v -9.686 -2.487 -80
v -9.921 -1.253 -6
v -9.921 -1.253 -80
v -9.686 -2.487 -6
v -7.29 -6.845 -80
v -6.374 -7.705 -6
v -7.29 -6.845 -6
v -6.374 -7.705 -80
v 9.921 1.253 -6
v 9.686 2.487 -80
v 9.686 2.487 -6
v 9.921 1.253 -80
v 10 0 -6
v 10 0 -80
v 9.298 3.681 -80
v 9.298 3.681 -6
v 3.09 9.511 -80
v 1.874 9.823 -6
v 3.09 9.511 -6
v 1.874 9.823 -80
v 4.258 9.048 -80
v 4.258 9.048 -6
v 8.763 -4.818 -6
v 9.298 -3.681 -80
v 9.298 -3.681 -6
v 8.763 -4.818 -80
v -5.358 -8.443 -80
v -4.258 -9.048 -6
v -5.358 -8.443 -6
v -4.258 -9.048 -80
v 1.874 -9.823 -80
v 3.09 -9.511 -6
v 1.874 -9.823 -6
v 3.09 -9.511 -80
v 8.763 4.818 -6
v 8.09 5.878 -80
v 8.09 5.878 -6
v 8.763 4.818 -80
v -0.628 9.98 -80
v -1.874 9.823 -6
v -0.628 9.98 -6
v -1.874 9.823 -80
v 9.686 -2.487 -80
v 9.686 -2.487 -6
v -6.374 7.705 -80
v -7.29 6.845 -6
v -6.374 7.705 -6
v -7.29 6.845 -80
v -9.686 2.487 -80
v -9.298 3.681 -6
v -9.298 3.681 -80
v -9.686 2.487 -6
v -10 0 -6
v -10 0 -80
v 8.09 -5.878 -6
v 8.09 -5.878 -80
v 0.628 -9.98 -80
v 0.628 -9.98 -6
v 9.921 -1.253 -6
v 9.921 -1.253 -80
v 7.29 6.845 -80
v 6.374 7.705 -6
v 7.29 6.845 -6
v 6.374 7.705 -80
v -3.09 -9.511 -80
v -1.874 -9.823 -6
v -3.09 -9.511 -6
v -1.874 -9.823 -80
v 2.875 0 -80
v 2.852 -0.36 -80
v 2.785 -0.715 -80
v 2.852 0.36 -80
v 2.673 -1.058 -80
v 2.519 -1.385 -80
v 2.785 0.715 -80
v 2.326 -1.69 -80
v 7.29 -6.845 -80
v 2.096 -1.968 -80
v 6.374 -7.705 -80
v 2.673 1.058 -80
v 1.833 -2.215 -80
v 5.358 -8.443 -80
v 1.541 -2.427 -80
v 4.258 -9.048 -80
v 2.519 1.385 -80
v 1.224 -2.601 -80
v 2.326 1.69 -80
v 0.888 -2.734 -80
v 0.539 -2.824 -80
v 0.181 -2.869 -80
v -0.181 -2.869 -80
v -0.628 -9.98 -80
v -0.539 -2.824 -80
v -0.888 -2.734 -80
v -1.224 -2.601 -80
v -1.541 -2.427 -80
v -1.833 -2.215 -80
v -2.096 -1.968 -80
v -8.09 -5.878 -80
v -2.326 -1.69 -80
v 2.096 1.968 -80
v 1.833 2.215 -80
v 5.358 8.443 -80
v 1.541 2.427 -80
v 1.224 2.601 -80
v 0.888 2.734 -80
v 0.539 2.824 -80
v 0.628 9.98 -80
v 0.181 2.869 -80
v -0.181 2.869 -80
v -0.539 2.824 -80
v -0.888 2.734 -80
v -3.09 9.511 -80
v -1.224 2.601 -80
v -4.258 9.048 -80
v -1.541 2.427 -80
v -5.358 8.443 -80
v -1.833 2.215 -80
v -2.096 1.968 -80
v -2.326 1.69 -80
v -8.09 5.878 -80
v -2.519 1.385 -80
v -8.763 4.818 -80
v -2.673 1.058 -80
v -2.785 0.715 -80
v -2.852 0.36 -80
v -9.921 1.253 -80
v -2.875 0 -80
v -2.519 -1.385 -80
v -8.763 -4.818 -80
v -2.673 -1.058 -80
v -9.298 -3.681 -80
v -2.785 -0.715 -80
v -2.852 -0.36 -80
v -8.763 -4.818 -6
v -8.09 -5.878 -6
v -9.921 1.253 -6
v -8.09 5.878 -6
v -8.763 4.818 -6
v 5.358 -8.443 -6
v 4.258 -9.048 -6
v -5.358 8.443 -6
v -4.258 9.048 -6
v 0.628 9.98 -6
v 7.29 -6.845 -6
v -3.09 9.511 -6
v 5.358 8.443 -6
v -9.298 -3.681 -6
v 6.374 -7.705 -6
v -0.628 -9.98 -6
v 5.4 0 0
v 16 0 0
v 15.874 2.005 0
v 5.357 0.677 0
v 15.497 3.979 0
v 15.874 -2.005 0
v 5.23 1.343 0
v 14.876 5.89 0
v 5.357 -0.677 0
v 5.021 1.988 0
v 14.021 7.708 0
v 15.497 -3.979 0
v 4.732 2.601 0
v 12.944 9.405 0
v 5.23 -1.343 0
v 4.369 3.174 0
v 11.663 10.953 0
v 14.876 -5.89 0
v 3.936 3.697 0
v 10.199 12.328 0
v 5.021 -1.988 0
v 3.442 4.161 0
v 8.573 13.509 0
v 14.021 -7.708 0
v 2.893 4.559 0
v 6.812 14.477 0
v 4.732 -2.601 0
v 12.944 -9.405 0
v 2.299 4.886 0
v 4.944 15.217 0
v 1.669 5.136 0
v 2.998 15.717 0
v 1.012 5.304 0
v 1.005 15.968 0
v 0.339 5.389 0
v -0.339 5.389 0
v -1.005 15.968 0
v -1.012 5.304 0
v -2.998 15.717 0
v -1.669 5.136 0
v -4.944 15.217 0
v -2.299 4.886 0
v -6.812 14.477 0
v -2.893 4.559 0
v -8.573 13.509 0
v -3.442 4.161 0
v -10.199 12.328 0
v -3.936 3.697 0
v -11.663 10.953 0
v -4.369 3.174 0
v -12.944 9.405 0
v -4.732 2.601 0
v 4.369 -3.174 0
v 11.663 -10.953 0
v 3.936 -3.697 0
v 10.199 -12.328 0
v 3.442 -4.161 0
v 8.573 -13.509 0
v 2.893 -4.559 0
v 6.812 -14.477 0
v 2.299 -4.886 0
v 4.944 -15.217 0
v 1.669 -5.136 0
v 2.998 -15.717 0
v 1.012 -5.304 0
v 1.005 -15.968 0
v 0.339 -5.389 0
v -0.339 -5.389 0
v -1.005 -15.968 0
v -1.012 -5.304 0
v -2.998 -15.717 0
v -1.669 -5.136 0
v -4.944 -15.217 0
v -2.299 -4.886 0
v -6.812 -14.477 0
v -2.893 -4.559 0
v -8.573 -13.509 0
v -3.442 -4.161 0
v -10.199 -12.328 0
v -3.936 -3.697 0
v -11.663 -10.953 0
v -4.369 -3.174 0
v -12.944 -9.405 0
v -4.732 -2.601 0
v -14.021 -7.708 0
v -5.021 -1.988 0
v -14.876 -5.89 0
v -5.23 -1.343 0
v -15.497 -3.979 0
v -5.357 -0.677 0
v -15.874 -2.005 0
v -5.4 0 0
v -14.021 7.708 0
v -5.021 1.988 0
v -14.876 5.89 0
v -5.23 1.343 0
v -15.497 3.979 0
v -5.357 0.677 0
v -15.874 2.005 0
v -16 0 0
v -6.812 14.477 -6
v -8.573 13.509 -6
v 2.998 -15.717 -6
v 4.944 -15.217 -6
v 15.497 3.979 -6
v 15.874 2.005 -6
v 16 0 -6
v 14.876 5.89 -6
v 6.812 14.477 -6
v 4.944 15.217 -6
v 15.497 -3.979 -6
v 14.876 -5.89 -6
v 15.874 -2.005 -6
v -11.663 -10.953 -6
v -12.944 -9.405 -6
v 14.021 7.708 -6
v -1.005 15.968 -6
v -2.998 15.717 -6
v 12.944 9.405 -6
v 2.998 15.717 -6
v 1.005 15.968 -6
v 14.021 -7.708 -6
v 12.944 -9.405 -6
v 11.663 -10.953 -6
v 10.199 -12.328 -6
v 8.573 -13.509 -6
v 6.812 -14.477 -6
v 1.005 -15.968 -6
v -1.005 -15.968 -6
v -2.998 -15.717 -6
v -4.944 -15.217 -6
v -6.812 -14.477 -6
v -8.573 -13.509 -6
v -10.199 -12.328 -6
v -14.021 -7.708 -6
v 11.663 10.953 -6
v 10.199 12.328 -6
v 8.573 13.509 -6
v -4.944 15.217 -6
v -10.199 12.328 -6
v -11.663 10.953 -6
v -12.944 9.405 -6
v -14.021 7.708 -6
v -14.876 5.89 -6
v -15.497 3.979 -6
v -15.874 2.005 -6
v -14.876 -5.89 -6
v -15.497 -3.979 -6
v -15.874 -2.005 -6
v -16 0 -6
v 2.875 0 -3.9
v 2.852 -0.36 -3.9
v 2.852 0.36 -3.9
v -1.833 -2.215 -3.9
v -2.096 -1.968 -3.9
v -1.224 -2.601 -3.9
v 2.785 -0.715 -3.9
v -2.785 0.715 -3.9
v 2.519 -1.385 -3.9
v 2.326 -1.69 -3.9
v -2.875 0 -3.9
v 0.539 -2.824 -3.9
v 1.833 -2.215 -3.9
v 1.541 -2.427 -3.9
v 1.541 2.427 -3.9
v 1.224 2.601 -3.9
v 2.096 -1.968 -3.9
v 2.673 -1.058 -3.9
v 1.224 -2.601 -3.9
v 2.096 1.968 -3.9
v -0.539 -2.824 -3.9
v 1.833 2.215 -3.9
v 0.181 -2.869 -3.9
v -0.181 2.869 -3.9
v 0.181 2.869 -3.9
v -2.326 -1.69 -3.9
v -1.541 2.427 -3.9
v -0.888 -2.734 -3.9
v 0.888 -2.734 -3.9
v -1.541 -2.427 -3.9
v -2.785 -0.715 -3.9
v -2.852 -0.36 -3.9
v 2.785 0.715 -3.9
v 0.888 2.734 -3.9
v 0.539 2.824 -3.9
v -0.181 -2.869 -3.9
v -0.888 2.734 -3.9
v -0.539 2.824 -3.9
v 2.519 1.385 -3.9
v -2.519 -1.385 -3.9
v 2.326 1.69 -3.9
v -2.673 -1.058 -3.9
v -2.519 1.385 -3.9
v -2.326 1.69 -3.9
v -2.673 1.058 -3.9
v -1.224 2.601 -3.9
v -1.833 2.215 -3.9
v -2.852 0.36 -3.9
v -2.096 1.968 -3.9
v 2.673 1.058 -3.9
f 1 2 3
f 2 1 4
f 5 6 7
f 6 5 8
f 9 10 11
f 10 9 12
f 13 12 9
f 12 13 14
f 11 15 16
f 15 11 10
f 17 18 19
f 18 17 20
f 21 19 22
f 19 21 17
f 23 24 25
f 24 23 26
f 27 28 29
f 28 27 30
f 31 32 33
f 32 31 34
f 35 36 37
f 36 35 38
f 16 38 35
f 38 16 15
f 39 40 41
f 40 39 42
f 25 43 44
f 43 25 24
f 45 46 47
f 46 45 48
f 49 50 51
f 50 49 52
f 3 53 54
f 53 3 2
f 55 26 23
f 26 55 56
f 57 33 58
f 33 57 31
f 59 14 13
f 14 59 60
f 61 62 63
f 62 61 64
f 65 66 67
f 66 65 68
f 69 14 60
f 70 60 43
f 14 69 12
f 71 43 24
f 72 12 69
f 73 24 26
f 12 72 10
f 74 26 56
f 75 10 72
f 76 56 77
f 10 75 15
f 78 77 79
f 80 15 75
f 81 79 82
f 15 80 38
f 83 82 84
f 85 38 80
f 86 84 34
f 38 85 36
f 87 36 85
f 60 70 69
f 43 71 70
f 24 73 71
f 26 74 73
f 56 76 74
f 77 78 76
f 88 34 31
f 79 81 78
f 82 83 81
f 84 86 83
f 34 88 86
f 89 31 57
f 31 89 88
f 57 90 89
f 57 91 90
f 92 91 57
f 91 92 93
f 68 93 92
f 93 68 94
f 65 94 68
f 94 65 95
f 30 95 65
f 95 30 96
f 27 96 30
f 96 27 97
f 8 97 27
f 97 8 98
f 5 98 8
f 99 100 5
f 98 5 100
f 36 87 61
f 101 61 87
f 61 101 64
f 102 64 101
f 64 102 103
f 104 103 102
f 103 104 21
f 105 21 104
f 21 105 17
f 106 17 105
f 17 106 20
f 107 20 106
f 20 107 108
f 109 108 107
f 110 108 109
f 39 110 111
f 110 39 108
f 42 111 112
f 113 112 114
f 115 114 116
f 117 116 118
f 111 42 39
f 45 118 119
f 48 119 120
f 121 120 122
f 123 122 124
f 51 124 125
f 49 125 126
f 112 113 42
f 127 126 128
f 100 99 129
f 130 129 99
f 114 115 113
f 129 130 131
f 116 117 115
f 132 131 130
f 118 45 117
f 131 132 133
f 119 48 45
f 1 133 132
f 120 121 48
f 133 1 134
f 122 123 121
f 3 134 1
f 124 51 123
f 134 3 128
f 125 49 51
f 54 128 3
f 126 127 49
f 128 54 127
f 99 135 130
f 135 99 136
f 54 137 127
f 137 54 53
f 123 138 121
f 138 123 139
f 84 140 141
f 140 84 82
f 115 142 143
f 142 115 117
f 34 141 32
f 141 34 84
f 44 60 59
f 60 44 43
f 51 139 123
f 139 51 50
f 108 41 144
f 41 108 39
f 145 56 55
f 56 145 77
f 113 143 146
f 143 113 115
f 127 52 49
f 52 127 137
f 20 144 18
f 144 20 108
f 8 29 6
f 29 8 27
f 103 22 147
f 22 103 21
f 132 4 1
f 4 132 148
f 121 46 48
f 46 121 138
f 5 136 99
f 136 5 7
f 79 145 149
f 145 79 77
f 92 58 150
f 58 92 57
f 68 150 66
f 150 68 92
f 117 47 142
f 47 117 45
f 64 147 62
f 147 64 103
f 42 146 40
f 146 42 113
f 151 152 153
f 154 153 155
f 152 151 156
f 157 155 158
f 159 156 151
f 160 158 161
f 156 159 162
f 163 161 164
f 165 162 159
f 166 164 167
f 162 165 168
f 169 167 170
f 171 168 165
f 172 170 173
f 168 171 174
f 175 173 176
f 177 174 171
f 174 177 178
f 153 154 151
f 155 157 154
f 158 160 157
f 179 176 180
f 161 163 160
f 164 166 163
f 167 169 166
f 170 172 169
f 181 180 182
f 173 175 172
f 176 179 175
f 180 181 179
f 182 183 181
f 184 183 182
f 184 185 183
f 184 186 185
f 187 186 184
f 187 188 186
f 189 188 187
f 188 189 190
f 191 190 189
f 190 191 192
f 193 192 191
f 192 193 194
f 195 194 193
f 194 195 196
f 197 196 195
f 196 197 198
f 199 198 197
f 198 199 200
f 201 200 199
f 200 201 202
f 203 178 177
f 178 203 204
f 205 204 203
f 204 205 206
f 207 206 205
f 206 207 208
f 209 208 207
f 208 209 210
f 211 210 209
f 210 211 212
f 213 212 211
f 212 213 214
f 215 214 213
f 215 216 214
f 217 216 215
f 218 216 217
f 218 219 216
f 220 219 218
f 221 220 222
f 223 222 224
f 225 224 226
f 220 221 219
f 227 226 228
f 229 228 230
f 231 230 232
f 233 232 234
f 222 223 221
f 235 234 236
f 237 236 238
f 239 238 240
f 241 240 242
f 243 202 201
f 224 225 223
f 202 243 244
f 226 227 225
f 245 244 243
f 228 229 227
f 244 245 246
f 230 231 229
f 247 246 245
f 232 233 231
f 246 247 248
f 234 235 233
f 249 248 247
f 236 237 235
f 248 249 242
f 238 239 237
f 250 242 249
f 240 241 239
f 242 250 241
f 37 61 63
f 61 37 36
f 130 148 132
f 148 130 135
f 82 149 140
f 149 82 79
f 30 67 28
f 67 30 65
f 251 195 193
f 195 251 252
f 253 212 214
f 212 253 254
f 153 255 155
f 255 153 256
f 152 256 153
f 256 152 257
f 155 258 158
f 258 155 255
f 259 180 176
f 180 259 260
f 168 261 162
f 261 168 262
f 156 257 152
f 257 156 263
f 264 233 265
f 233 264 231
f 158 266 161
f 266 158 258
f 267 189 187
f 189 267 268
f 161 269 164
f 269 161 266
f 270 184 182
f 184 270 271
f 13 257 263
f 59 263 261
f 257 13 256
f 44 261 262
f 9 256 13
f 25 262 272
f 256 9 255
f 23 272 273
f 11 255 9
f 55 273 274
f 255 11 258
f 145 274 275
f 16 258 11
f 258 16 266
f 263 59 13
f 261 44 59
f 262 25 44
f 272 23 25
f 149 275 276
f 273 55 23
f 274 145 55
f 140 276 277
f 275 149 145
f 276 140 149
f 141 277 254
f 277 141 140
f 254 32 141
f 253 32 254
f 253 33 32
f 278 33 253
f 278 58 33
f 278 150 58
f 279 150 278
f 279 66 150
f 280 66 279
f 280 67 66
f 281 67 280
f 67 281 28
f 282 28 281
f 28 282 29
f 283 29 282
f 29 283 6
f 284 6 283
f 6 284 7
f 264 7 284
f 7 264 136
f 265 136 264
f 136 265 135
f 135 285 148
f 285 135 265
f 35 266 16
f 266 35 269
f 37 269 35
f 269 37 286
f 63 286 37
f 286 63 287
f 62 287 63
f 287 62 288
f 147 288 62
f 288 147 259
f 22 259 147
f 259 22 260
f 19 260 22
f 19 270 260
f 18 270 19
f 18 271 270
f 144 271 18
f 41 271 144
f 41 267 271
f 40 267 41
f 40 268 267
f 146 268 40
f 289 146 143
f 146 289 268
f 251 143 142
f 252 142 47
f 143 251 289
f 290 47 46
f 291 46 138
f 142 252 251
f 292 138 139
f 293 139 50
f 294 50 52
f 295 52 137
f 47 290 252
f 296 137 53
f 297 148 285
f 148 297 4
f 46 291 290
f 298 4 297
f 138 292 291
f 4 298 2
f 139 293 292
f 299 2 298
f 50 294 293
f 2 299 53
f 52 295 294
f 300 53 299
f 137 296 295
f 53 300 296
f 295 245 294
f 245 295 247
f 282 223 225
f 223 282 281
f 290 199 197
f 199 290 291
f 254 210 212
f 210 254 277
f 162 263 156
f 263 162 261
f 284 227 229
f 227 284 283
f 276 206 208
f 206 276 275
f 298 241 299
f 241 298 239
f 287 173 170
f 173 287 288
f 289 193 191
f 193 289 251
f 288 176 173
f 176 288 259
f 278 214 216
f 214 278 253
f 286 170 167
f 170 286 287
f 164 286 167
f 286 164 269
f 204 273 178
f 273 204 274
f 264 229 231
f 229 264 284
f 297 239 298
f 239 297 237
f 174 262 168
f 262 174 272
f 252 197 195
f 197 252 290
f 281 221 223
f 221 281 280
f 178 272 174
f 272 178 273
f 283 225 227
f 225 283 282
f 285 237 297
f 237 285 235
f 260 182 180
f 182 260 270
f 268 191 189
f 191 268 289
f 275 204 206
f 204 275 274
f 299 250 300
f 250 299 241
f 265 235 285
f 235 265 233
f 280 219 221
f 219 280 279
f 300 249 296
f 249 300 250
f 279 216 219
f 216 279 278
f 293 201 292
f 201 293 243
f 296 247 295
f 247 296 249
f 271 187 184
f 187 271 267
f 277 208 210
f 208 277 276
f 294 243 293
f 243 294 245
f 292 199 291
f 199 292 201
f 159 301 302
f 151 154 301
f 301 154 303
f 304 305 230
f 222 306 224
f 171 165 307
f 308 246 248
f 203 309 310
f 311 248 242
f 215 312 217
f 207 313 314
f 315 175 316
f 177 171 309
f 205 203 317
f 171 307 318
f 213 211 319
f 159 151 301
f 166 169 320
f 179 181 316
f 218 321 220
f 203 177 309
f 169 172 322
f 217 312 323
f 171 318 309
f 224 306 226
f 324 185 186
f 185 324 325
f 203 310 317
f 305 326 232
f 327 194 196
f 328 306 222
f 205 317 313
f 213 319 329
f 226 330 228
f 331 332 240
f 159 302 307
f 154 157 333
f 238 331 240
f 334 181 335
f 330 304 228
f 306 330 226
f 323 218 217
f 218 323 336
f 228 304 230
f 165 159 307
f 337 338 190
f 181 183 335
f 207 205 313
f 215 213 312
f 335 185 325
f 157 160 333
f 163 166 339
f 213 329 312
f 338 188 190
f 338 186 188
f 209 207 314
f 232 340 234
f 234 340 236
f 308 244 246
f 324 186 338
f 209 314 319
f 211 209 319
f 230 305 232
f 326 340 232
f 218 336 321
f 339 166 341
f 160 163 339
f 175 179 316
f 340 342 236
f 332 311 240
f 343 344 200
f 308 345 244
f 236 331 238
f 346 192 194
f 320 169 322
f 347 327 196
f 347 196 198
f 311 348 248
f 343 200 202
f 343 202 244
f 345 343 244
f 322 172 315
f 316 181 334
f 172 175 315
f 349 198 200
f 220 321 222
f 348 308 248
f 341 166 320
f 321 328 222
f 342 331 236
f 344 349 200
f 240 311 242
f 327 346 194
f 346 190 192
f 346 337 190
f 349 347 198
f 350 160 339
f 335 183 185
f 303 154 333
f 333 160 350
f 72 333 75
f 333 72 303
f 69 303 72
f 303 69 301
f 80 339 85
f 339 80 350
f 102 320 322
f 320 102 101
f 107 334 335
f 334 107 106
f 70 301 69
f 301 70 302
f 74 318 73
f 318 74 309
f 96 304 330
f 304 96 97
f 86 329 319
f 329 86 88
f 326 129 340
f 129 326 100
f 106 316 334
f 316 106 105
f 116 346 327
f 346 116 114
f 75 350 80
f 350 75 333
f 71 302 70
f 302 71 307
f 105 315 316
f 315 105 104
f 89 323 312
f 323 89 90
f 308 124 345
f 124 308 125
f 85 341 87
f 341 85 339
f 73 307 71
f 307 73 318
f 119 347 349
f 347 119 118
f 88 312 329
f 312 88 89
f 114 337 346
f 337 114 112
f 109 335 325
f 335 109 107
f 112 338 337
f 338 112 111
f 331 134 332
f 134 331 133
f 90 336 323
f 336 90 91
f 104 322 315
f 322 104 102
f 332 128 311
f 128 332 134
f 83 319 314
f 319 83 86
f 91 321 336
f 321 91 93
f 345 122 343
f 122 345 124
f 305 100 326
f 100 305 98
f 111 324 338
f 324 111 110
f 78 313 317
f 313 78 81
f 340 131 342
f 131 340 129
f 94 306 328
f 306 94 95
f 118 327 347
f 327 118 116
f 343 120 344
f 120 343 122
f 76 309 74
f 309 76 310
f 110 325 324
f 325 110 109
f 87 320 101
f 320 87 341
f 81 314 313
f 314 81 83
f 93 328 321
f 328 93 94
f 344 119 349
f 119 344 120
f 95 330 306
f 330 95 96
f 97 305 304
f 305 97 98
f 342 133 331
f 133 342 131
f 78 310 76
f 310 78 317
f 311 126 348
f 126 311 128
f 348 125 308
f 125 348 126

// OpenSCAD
$fn = 50;


difference() {
	union() {
		translate(v = [0, 0, -80.0000000000]) {
			cylinder(h = 80, r = 10.0000000000);
		}
		translate(v = [0, 0, -6.0000000000]) {
			cylinder(h = 6, r = 16.0000000000);
		}
	}
	union() {
		translate(v = [0, 0, 0]) {
			rotate(a = [0, 0, 0]) {
				difference() {
					union() {
						#translate(v = [0, 0, -80.0000000000]) {
							cylinder(h = 80, r = 2.6000000000);
						}
						#translate(v = [0, 0, -3.9000000000]) {
							cylinder(h = 3.9000000000, r = 10.0000000000, r1 = 2.8750000000, r2 = 5.4000000000);
						}
						#translate(v = [0, 0, -80.0000000000]) {
							cylinder(h = 80, r = 2.8750000000);
						}
						#translate(v = [0, 0, -80.0000000000]) {
							cylinder(h = 80, r = 2.6000000000);
						}
					}
					union();
				}
			}
		}
	}
}
